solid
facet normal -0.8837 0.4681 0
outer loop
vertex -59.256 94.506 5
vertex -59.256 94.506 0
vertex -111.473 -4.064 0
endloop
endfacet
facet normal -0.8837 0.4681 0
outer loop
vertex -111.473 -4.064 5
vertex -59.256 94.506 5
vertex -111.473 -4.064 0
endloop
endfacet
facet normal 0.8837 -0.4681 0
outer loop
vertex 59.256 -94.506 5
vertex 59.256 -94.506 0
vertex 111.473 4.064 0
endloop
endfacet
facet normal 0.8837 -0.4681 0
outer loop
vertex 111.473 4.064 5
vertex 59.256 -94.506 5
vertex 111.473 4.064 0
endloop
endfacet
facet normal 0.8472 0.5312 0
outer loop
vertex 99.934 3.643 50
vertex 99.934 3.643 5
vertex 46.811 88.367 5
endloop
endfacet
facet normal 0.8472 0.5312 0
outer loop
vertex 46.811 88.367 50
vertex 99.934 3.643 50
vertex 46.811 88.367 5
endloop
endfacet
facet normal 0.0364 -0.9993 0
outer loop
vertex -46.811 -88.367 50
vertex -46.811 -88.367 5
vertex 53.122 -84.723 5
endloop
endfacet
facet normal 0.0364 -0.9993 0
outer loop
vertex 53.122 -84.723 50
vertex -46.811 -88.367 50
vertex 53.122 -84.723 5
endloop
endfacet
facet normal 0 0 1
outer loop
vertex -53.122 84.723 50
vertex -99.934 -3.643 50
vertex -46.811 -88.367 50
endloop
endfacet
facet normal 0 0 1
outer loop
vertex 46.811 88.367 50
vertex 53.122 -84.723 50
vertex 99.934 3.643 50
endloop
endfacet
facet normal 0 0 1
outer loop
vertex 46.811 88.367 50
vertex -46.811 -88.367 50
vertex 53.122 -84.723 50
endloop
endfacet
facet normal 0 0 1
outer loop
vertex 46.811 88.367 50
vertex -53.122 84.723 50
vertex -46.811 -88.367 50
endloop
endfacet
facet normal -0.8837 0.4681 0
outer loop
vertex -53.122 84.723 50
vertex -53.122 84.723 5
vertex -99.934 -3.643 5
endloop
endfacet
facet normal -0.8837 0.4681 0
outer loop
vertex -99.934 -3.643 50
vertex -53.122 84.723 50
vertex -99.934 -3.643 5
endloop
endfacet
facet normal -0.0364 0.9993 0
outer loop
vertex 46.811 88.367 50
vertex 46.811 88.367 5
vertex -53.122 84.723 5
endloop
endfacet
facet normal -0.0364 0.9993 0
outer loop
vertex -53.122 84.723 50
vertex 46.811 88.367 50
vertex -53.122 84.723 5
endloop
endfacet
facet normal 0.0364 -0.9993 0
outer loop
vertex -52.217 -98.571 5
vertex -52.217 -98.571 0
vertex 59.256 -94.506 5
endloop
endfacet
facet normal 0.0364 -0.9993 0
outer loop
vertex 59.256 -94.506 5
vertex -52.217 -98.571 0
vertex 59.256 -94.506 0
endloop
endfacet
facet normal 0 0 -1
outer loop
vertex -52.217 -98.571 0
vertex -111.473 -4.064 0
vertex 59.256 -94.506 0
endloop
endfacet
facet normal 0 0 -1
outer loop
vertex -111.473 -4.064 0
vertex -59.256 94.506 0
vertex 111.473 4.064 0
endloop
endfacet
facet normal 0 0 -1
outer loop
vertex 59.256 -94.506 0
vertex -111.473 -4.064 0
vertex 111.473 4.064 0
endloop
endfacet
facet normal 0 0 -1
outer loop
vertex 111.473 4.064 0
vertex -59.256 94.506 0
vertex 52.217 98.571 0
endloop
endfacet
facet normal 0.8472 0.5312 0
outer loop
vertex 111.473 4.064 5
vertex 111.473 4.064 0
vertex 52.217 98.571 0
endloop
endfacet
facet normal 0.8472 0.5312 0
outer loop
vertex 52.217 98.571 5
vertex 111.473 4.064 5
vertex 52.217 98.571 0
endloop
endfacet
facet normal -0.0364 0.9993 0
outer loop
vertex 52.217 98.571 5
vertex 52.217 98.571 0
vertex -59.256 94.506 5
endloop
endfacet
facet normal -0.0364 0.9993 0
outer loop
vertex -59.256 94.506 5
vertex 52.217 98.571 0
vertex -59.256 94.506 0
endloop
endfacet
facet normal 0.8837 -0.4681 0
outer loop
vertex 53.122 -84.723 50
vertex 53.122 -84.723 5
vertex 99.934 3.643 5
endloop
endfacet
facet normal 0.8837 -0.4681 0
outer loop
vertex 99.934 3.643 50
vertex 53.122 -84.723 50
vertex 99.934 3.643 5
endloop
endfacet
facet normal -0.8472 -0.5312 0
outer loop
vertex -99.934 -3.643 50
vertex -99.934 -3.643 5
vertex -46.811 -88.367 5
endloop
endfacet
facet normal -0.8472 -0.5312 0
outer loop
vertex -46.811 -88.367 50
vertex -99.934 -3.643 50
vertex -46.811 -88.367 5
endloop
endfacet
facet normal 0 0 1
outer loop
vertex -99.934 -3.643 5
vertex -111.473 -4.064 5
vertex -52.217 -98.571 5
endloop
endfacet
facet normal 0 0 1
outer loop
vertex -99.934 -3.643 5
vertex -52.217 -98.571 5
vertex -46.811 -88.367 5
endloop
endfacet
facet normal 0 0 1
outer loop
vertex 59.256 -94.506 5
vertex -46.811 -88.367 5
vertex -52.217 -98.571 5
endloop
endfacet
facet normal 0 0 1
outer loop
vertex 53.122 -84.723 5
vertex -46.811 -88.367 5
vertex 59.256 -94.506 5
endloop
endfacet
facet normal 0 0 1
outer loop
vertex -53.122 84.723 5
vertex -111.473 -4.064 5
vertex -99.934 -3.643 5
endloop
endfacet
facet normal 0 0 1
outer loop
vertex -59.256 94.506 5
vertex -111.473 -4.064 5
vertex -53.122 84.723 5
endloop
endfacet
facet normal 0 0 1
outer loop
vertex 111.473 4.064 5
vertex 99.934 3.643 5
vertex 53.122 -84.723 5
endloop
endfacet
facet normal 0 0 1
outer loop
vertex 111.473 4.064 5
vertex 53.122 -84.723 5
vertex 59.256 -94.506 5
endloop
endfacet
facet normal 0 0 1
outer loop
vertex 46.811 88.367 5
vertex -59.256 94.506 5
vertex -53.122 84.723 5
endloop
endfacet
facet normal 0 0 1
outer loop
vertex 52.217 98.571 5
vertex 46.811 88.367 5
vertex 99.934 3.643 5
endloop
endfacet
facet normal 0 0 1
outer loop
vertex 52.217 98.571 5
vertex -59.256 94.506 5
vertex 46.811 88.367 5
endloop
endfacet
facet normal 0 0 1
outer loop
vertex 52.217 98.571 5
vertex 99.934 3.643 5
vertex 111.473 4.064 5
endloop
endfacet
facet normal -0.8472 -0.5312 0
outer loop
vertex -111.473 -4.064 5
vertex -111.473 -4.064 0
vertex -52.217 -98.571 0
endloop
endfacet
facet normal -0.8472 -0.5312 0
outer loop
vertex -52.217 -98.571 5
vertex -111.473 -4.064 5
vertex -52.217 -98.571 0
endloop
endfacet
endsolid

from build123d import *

# Parameters (mm, degrees)
F1_DEPTH = 50
F3_DEPTH = 5


with BuildPart() as f1:
    # F0 (on Top) → F1 (new body)
    with BuildSketch(Plane.XY):
        Polygon((53.122164, -84.723289), (99.933603, 3.643499), (46.811438, 88.366788), (-53.122164, 84.723289), (-99.933603, -3.643499), (-46.811438, -88.366788), align=None)
    extrude(amount=F1_DEPTH)

    # F2 (on face) → F3 (join)
    with BuildSketch(Plane.XY):
        Polygon((-52.216758, -98.570506), (59.256183, -94.506292), (111.472941, 4.064214), (52.216758, 98.570506), (-59.256183, 94.506292), (-111.472941, -4.064214), align=None)
        Polygon((99.933603, 3.643499), (53.122164, -84.723289), (-46.811438, -88.366788), (-99.933603, -3.643499), (-53.122164, 84.723289), (46.811438, 88.366788), align=None, mode=Mode.SUBTRACT)
    extrude(amount=F3_DEPTH)


solid = f1.part
